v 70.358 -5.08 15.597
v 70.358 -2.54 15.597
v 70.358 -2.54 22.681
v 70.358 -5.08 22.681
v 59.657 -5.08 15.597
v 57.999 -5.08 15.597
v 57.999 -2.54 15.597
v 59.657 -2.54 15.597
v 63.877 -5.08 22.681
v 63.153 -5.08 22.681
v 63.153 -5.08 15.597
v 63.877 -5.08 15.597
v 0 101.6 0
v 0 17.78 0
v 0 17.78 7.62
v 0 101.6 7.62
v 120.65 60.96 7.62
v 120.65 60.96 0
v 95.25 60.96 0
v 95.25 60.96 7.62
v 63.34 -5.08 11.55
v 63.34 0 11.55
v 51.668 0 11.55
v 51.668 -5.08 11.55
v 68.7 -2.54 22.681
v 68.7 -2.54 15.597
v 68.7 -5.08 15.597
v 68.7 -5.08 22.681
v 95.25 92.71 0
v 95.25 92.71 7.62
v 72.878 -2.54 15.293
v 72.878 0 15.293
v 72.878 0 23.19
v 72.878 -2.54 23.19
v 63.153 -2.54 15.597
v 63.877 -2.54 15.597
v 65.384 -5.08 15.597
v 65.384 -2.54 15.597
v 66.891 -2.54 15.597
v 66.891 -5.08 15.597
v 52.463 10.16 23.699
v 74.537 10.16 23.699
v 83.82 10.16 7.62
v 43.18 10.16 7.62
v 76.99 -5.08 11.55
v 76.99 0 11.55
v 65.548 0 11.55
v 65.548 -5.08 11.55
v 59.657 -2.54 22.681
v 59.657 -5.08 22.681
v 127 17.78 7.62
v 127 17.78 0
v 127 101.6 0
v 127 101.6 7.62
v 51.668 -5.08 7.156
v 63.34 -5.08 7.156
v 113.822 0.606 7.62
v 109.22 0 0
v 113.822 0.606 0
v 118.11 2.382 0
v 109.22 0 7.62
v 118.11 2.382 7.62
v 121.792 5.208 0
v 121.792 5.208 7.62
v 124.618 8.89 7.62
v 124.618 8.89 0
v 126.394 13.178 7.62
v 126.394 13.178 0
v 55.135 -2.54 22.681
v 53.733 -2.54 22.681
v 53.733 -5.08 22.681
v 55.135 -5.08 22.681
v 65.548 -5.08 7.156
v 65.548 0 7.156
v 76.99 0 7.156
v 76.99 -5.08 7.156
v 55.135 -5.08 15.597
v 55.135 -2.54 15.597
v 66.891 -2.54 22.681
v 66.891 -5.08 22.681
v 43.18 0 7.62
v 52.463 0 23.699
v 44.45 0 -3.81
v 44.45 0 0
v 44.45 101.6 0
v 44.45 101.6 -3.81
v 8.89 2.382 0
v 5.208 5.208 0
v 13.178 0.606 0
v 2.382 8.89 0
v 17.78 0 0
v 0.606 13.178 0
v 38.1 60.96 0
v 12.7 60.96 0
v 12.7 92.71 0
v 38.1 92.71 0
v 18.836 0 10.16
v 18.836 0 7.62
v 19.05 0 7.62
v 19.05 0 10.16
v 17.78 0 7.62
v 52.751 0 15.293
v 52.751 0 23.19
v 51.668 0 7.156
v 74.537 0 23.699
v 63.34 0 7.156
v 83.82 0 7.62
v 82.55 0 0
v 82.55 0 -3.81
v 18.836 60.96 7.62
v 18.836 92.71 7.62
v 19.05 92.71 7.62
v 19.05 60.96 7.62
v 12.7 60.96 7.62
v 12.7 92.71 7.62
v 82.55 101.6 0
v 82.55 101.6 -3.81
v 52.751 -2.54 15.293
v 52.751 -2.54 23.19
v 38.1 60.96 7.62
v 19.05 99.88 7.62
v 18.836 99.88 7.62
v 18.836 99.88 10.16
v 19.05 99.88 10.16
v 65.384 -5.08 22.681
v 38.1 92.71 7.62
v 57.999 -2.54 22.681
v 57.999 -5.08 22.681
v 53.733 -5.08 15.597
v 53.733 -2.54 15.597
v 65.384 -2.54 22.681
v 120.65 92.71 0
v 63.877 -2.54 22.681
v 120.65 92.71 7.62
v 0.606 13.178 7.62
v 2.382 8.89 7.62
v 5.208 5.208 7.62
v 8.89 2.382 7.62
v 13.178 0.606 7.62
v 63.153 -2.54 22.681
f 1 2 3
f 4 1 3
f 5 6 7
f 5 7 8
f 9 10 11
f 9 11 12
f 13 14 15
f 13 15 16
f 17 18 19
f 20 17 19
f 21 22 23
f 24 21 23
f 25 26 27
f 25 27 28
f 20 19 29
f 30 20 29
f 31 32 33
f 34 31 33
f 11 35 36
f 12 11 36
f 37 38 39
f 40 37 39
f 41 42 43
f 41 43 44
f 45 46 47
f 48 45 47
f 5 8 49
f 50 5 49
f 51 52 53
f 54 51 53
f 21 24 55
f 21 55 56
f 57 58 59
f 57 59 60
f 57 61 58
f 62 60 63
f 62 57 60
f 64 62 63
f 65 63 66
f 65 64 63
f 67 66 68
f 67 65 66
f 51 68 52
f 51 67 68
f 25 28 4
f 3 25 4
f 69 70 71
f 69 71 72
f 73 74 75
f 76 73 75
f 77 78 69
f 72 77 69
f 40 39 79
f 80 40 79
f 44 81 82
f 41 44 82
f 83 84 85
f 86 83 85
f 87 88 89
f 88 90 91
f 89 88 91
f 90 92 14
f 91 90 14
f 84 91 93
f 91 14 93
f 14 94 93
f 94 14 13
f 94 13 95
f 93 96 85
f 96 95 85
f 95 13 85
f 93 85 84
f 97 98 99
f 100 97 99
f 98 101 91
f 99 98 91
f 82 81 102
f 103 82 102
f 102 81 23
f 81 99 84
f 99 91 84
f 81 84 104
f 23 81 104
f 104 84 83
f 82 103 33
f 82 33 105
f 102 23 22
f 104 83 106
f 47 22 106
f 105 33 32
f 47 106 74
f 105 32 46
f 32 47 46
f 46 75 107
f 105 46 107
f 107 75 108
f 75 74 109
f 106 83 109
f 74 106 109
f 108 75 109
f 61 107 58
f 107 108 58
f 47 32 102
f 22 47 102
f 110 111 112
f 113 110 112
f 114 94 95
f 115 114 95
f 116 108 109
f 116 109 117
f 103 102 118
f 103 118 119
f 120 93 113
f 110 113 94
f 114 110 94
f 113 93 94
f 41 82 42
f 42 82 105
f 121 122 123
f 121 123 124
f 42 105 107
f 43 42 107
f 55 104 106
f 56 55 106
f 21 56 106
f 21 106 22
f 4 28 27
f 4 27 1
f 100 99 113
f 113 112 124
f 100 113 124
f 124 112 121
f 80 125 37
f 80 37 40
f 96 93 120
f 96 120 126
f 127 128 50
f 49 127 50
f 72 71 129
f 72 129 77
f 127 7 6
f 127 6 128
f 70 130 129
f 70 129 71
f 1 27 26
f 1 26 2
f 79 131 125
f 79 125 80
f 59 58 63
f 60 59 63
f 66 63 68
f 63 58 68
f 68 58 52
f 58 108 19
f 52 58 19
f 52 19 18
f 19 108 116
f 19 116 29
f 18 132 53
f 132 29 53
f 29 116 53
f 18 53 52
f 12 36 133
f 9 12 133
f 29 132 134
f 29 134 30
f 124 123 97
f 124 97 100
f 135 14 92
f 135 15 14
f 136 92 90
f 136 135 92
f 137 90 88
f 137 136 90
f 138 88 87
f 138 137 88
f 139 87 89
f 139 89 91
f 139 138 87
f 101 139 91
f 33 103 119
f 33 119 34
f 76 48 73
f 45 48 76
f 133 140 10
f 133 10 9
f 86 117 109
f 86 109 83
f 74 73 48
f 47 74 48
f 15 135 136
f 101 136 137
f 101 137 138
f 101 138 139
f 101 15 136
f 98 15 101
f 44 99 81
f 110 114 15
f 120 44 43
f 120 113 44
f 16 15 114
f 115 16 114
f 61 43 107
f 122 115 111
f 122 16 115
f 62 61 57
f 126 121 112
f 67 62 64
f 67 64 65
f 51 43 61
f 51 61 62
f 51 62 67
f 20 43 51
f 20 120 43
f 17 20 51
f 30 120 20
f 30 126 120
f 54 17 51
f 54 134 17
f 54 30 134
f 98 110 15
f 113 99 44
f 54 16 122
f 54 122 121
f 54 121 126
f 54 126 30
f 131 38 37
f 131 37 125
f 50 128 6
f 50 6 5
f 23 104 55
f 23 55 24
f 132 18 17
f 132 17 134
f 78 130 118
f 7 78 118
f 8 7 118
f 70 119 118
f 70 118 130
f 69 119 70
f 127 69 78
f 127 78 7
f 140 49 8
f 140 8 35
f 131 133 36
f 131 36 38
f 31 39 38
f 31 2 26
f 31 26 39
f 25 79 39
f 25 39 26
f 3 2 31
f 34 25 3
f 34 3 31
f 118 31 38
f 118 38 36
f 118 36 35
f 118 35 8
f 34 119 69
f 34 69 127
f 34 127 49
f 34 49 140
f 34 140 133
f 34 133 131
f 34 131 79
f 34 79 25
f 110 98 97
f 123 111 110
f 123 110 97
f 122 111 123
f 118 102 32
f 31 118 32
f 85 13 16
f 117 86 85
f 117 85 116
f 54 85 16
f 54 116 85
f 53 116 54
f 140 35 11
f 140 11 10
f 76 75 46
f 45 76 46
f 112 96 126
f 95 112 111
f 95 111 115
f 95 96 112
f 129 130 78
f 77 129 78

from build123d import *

# Parameters (mm, degrees)
SKETCH1_W           = 127
SKETCH1_H           = 101.6
BOSS_EXTRUDE1_DEPTH = 7.62
SKETCH3_W           = 38.1
SKETCH3_H           = 101.6
BOSS_EXTRUDE2_DEPTH = 3.81
SKETCH4_W           = 25.4
SKETCH4_H           = 31.75
CUT_EXTRUDE1_DEPTH  = 7.62
FILLET1_R           = 17.78
BOSS_EXTRUDE3_DEPTH = 10.16
SKETCH6_W           = 1.401774382
SKETCH6_H           = 7.084034581
SKETCH6_W_2         = 1.657965541
SKETCH6_W_3         = 0.723515752
SKETCH6_W_4         = 1.5072414
SKETCH6_W_5         = 1.65796554
SKETCH6_W_6         = 12.660827761
SKETCH6_H_2         = 4.394326049
SKETCH6_W_7         = 12.660827762
BOSS_EXTRUDE4_DEPTH = 5.08
SKETCH7_W           = 0.989162869
SKETCH7_H           = 4.394326049
SKETCH7_W_2         = 1.219468424
CUT_EXTRUDE2_DEPTH  = 5.08
SKETCH8_W           = 20.126718604
SKETCH8_H           = 7.896323228
BOSS_EXTRUDE5_DEPTH = 2.54
SKETCH9_W           = 0.213588314
SKETCH9_H           = 99.880159493
BOSS_EXTRUDE6_DEPTH = 2.54


with BuildPart() as part:
    # Sketch1 → Boss-Extrude1 (new body)
    with BuildSketch(Plane.XY):
        with Locations((63.5, 50.8)):
            Rectangle(SKETCH1_W, SKETCH1_H)
    extrude(amount=BOSS_EXTRUDE1_DEPTH)

    # Sketch3 → Boss-Extrude2 (add)
    with BuildSketch(Plane(origin=(0, 0, 0), x_dir=(-1, 0, 0), z_dir=(0, 0, -1))):
        with Locations((-63.5, 50.8)):
            Rectangle(SKETCH3_W, SKETCH3_H)
    extrude(amount=BOSS_EXTRUDE2_DEPTH)

    # Sketch4 → Cut-Extrude1 (cut)
    with BuildSketch(Plane(origin=(0, 0, 0), x_dir=(-1, 0, 0), z_dir=(0, 0, -1))):
        with Locations((-25.4, 76.835)):
            Rectangle(SKETCH4_W, SKETCH4_H)
        with Locations((-107.95, 76.835)):
            Rectangle(SKETCH4_W, SKETCH4_H)
    extrude(amount=-CUT_EXTRUDE1_DEPTH, mode=Mode.SUBTRACT)

    # Fillet1
    fillet1_edges = [part.edges().sort_by_distance(p)[0] for p in [
        (127, 0, 3.81),
        (0, 0, 3.81),
    ]]
    fillet(fillet1_edges, radius=FILLET1_R)

    # Sketch5 → Boss-Extrude3 (add)
    with BuildSketch(Plane.XZ):
        Polygon((43.18, 7.62), (52.463035847, 23.698689735), (74.536964153, 23.698689735), (83.82, 7.62), align=None)
    extrude(amount=-BOSS_EXTRUDE3_DEPTH)

    # Sketch6 → Boss-Extrude4 (add)
    with BuildSketch(Plane.XZ):
        with Locations((54.433923038, 19.138517409)):
            Rectangle(SKETCH6_W, SKETCH6_H)
        with Locations((58.82755166, 19.138517409)):
            Rectangle(SKETCH6_W_2, SKETCH6_H)
        with Locations((63.515052474, 19.138517409)):
            Rectangle(SKETCH6_W_3, SKETCH6_H)
        with Locations((66.13767245, 19.138517409)):
            Rectangle(SKETCH6_W_4, SKETCH6_H)
        with Locations((69.528965601, 19.138517409)):
            Rectangle(SKETCH6_W_5, SKETCH6_H)
        with Locations((57.99856889, 9.353111302)):
            Rectangle(SKETCH6_W_6, SKETCH6_H_2)
        with Locations((70.659396651, 9.353111302)):
            Rectangle(SKETCH6_W_7, SKETCH6_H_2)
    extrude(amount=BOSS_EXTRUDE4_DEPTH)

    # Sketch7 → Cut-Extrude2 (cut)
    with BuildSketch(Plane.XZ.offset(5.08)):
        with Locations((63.834401336, 9.353111302)):
            Rectangle(SKETCH7_W, SKETCH7_H)
        with Locations((64.938716982, 9.353111302)):
            Rectangle(SKETCH7_W_2, SKETCH7_H)
    extrude(amount=-CUT_EXTRUDE2_DEPTH, mode=Mode.SUBTRACT)

    # Sketch8 → Boss-Extrude5 (add)
    with BuildSketch(Plane.XZ):
        with Locations((62.814636368, 19.241529297)):
            Rectangle(SKETCH8_W, SKETCH8_H)
    extrude(amount=BOSS_EXTRUDE5_DEPTH)

    # Sketch9 → Boss-Extrude6 (add)
    with BuildSketch(Plane.XY.offset(7.62)):
        with Locations((18.943205843, 49.940079747)):
            Rectangle(SKETCH9_W, SKETCH9_H)
    extrude(amount=BOSS_EXTRUDE6_DEPTH)


solid = part.part
